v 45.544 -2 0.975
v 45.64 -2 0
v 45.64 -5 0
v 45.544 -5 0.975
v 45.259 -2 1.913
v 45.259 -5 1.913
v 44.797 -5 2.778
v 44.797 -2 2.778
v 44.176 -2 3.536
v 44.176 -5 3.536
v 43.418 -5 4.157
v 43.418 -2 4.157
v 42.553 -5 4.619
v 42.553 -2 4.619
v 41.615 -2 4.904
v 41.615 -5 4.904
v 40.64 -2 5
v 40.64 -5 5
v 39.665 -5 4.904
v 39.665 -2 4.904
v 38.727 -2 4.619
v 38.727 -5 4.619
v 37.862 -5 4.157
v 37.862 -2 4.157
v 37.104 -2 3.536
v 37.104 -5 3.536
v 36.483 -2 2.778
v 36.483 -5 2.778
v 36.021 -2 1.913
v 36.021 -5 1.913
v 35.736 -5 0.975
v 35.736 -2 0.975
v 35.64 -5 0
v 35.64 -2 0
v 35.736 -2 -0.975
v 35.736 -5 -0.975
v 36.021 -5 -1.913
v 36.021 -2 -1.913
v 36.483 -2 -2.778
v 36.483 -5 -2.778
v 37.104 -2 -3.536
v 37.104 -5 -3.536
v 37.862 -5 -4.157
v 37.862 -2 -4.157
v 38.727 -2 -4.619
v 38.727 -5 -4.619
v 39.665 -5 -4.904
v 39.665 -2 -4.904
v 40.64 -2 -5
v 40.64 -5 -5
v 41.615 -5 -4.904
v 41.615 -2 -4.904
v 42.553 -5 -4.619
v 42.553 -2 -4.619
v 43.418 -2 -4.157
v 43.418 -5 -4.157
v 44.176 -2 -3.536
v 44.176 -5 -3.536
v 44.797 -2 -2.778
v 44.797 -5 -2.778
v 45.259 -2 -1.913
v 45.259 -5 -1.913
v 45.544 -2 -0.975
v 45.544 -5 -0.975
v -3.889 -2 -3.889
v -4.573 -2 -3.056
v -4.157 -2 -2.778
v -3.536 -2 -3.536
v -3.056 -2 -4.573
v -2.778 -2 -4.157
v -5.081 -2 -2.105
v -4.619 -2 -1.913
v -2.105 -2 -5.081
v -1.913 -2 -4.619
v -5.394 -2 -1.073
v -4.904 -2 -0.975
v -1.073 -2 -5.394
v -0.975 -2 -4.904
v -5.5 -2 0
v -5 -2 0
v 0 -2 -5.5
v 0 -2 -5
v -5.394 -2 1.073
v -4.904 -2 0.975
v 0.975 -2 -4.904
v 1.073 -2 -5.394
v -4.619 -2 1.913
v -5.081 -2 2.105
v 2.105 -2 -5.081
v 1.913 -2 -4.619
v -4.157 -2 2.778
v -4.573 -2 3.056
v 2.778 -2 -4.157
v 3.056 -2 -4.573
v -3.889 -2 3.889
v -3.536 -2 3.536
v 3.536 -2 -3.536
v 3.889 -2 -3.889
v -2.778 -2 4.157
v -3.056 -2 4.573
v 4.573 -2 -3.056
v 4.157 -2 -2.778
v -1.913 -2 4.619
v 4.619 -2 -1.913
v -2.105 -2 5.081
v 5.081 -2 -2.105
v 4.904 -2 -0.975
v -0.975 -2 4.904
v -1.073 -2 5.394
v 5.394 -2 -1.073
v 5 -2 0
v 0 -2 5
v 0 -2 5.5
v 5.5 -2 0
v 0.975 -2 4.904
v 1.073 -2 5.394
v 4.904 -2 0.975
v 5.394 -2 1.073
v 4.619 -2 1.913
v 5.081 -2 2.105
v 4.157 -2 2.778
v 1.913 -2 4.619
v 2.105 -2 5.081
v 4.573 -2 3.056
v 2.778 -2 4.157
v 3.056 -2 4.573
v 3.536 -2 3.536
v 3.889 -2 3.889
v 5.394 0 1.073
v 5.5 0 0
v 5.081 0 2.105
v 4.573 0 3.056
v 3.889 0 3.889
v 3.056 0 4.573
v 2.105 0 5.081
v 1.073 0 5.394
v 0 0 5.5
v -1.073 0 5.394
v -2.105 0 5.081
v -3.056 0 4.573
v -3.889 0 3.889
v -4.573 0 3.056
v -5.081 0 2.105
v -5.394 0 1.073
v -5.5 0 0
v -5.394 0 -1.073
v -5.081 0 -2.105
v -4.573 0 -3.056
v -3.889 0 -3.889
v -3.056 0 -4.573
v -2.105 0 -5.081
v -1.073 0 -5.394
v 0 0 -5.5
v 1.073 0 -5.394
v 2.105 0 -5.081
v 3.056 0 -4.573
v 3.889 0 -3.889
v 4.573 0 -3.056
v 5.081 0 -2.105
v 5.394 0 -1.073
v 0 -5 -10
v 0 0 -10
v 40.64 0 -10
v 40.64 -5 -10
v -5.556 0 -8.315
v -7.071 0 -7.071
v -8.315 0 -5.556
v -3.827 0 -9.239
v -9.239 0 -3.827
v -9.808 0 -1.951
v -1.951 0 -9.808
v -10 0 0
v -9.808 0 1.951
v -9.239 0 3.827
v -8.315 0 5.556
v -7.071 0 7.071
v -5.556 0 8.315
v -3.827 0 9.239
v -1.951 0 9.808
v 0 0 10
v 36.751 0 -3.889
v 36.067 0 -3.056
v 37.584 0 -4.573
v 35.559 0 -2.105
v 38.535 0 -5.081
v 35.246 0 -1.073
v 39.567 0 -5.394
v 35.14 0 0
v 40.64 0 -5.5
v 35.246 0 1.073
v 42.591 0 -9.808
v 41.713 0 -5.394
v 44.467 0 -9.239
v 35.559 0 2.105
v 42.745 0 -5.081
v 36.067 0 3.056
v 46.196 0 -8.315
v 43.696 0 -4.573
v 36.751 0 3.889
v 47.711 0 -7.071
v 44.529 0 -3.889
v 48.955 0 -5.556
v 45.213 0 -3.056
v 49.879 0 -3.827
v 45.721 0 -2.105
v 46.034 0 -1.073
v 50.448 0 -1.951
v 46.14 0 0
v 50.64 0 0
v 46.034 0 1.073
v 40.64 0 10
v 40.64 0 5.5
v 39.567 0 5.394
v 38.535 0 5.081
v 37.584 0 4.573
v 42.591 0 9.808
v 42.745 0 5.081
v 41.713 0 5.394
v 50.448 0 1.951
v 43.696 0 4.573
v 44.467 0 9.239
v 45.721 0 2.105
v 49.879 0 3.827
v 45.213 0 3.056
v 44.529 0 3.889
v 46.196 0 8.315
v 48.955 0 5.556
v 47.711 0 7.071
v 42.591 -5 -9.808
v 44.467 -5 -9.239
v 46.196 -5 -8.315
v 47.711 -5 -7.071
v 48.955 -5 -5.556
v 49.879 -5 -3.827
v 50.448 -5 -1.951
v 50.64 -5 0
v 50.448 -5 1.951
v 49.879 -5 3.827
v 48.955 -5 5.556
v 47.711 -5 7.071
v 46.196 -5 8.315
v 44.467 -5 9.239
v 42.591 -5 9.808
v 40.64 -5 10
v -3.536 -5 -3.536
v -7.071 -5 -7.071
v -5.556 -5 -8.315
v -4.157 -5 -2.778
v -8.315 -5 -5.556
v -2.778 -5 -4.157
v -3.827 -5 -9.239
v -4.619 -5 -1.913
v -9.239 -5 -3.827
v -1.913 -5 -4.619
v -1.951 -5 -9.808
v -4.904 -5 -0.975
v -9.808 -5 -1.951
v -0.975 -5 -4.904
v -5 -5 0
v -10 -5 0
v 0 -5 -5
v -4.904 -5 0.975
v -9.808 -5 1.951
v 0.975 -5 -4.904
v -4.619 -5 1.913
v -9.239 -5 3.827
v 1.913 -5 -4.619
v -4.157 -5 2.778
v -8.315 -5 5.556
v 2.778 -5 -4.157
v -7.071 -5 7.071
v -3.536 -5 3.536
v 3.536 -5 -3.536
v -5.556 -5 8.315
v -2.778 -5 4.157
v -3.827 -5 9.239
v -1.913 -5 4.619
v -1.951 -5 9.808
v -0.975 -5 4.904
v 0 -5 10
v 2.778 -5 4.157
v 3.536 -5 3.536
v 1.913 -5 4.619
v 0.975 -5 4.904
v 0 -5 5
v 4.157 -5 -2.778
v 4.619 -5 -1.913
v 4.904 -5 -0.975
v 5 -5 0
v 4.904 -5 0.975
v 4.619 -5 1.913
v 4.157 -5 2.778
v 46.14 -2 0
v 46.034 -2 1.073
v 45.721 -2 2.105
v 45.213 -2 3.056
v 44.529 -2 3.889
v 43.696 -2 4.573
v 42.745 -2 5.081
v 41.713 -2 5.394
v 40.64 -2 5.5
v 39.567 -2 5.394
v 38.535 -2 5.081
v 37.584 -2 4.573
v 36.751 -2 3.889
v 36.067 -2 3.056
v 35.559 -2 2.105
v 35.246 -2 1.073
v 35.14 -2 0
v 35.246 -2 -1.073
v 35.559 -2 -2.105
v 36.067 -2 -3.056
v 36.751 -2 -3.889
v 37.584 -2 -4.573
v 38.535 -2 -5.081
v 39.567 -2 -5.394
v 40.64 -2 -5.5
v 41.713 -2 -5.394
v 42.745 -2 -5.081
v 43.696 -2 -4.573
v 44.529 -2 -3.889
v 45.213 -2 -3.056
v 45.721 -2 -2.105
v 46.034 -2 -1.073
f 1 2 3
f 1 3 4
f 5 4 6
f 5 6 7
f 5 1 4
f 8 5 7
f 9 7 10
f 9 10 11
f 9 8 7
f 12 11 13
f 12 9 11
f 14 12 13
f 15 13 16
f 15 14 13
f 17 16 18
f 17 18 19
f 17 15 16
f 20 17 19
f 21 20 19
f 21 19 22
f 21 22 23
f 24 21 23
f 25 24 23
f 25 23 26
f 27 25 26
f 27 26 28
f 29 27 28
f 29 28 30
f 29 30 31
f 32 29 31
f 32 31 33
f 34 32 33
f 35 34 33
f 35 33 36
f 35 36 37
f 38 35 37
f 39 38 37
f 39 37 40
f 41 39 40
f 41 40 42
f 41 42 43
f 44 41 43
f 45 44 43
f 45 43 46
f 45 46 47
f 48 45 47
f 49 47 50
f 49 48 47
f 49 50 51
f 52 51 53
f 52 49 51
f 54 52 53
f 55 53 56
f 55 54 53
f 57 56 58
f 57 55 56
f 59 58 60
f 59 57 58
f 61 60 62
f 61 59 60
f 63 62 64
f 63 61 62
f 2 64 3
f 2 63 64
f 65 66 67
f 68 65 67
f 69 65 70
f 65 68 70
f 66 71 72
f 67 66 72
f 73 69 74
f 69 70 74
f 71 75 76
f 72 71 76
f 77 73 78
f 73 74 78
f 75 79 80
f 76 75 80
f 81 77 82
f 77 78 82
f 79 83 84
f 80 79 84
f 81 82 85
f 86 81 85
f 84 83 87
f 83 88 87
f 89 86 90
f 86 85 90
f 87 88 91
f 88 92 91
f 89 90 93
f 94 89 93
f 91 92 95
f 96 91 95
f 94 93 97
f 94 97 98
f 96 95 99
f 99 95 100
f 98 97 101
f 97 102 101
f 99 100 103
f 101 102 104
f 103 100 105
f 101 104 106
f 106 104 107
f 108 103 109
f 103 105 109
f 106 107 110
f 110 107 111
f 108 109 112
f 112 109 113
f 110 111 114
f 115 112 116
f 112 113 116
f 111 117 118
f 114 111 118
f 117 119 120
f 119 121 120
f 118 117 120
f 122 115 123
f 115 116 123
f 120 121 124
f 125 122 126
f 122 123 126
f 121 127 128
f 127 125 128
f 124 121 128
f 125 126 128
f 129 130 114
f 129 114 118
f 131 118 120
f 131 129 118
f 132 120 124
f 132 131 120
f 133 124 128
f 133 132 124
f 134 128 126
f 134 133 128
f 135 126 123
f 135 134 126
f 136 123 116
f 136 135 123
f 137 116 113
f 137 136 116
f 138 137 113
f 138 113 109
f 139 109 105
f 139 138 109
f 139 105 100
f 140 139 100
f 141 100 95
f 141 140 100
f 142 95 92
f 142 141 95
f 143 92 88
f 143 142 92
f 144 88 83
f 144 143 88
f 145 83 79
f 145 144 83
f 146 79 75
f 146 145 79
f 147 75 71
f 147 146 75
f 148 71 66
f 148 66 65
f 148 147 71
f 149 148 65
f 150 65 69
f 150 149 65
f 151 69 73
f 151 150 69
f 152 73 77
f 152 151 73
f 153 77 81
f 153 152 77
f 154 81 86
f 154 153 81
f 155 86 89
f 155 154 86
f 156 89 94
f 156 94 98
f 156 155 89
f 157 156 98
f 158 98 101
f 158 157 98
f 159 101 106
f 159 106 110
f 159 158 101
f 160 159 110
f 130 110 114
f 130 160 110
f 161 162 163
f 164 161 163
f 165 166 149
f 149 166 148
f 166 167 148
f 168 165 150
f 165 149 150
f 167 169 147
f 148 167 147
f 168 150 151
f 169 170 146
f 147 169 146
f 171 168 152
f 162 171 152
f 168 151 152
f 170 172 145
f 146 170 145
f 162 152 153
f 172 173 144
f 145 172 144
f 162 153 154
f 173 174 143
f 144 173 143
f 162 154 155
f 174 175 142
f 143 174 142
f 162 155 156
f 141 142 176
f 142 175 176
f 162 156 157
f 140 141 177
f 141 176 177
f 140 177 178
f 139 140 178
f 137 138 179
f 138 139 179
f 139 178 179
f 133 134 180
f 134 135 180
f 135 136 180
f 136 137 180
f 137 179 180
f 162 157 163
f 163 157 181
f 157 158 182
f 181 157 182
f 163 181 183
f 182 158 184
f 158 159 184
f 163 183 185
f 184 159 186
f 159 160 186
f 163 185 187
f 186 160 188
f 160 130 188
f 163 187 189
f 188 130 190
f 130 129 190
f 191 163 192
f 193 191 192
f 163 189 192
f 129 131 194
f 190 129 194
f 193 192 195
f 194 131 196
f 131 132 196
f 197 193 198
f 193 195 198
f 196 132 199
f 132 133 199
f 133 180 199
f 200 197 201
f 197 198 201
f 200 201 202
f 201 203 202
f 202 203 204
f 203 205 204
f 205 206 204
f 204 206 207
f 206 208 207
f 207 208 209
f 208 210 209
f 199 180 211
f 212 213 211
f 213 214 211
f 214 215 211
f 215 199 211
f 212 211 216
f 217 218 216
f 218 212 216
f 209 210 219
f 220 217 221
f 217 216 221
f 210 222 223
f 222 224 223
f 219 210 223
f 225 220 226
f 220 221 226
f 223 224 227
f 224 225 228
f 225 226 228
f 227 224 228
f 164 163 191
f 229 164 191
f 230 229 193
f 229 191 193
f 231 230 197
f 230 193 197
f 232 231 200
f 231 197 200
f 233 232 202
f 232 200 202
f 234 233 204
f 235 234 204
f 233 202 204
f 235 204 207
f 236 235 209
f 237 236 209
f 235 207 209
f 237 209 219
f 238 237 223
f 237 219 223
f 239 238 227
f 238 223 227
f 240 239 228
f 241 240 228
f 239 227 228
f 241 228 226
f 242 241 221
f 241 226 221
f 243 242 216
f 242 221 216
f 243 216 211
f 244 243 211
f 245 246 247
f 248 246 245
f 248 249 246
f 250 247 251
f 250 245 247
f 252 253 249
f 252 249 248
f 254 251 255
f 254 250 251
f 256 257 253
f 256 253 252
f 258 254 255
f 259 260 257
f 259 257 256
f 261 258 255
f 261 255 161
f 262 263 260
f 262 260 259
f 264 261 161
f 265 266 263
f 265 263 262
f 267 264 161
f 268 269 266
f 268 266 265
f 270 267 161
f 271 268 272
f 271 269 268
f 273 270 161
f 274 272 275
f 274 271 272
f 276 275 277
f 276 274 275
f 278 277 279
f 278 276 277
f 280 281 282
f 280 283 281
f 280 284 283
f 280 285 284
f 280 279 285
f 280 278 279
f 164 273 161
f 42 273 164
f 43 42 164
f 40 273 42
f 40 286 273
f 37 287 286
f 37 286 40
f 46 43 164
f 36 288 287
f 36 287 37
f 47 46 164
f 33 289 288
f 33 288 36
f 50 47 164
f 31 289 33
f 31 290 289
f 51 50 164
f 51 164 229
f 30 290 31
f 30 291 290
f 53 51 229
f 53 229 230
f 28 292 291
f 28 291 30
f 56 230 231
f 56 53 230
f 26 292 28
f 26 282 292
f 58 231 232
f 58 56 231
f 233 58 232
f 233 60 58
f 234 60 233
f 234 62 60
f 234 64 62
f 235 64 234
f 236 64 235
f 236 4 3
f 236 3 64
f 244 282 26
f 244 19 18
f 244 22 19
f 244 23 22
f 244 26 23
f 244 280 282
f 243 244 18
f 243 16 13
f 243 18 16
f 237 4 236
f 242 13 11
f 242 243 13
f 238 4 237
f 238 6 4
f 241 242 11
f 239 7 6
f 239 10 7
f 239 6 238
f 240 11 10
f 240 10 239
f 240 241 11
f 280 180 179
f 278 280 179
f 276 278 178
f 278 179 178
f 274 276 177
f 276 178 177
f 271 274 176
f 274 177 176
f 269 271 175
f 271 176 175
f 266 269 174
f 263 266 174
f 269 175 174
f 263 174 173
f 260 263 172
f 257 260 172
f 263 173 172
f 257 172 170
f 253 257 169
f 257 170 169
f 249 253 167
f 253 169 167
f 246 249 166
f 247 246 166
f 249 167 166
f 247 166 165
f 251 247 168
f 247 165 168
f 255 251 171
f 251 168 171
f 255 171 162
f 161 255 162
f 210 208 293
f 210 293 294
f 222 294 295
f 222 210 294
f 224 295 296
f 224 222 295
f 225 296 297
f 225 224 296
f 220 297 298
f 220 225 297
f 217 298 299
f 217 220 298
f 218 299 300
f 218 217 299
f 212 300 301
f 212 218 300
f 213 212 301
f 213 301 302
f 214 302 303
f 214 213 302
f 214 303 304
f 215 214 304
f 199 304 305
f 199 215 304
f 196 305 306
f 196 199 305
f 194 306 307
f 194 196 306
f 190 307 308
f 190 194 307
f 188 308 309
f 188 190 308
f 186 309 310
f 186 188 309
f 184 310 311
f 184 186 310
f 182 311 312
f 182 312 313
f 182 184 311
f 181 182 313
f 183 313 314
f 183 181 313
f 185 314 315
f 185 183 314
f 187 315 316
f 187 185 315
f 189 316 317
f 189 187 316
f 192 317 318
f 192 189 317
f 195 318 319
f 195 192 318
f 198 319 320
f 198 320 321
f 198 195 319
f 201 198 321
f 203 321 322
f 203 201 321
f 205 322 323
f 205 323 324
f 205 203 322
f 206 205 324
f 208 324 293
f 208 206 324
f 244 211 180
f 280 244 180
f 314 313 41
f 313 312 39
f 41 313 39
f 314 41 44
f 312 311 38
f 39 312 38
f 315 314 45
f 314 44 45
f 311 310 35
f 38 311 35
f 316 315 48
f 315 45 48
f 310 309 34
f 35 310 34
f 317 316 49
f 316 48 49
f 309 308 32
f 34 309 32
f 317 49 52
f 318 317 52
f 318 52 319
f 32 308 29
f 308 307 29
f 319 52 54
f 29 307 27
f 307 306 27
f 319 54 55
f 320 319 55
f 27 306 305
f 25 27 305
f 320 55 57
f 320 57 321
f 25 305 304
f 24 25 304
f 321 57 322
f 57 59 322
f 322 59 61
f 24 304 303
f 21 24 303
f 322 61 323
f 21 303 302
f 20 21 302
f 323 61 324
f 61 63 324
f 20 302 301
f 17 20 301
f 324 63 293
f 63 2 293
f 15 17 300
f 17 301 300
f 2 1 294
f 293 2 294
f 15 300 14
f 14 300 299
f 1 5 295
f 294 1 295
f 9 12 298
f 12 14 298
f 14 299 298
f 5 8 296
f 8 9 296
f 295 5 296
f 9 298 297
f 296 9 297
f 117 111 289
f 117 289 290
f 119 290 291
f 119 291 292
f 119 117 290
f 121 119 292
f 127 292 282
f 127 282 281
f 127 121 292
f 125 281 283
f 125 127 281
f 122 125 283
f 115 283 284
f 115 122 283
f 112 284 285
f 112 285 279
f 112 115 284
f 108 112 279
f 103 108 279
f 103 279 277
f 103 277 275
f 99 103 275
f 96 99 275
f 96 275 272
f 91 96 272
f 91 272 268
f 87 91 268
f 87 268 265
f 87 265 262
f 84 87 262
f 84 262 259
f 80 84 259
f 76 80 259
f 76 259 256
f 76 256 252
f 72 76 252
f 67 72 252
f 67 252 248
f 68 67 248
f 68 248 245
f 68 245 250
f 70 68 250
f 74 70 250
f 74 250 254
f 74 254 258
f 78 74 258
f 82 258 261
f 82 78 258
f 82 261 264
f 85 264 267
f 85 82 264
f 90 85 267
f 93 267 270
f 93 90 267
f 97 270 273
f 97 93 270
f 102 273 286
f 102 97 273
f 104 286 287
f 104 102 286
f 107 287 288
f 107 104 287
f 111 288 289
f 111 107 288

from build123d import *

# Parameters (mm, degrees)
F0_R     = 5.5
F0_R_2   = 5
F1_DEPTH = 5
F2_DEPTH = 2


with BuildPart() as f1:
    # F0 (on Front) → F1 (new body)
    with BuildSketch(Plane.XZ):
        with BuildLine():
            Line((40.64, 10), (0, 10))
            ThreePointArc((0, 10), (-10, 0), (0, -10))
            Line((0, -10), (40.64, -10))
            ThreePointArc((40.64, -10), (50.64, 0), (40.64, 10))
        make_face()
        Circle(F0_R, mode=Mode.SUBTRACT)
        with Locations((40.64, 0)):
            Circle(F0_R, mode=Mode.SUBTRACT)
        Circle(F0_R)
        Circle(F0_R_2, mode=Mode.SUBTRACT)
        with Locations((40.64, 0)):
            Circle(F0_R)
        with Locations((40.64, 0)):
            Circle(F0_R_2, mode=Mode.SUBTRACT)
    extrude(amount=F1_DEPTH)

    # F0 (on Front) → F2 (cut)
    with BuildSketch(Plane.XZ):
        with Locations((40.64, 0)):
            Circle(F0_R)
        with Locations((40.64, 0)):
            Circle(F0_R_2, mode=Mode.SUBTRACT)
        Circle(F0_R)
        Circle(F0_R_2, mode=Mode.SUBTRACT)
    extrude(amount=F2_DEPTH, mode=Mode.SUBTRACT)


solid = f1.part
